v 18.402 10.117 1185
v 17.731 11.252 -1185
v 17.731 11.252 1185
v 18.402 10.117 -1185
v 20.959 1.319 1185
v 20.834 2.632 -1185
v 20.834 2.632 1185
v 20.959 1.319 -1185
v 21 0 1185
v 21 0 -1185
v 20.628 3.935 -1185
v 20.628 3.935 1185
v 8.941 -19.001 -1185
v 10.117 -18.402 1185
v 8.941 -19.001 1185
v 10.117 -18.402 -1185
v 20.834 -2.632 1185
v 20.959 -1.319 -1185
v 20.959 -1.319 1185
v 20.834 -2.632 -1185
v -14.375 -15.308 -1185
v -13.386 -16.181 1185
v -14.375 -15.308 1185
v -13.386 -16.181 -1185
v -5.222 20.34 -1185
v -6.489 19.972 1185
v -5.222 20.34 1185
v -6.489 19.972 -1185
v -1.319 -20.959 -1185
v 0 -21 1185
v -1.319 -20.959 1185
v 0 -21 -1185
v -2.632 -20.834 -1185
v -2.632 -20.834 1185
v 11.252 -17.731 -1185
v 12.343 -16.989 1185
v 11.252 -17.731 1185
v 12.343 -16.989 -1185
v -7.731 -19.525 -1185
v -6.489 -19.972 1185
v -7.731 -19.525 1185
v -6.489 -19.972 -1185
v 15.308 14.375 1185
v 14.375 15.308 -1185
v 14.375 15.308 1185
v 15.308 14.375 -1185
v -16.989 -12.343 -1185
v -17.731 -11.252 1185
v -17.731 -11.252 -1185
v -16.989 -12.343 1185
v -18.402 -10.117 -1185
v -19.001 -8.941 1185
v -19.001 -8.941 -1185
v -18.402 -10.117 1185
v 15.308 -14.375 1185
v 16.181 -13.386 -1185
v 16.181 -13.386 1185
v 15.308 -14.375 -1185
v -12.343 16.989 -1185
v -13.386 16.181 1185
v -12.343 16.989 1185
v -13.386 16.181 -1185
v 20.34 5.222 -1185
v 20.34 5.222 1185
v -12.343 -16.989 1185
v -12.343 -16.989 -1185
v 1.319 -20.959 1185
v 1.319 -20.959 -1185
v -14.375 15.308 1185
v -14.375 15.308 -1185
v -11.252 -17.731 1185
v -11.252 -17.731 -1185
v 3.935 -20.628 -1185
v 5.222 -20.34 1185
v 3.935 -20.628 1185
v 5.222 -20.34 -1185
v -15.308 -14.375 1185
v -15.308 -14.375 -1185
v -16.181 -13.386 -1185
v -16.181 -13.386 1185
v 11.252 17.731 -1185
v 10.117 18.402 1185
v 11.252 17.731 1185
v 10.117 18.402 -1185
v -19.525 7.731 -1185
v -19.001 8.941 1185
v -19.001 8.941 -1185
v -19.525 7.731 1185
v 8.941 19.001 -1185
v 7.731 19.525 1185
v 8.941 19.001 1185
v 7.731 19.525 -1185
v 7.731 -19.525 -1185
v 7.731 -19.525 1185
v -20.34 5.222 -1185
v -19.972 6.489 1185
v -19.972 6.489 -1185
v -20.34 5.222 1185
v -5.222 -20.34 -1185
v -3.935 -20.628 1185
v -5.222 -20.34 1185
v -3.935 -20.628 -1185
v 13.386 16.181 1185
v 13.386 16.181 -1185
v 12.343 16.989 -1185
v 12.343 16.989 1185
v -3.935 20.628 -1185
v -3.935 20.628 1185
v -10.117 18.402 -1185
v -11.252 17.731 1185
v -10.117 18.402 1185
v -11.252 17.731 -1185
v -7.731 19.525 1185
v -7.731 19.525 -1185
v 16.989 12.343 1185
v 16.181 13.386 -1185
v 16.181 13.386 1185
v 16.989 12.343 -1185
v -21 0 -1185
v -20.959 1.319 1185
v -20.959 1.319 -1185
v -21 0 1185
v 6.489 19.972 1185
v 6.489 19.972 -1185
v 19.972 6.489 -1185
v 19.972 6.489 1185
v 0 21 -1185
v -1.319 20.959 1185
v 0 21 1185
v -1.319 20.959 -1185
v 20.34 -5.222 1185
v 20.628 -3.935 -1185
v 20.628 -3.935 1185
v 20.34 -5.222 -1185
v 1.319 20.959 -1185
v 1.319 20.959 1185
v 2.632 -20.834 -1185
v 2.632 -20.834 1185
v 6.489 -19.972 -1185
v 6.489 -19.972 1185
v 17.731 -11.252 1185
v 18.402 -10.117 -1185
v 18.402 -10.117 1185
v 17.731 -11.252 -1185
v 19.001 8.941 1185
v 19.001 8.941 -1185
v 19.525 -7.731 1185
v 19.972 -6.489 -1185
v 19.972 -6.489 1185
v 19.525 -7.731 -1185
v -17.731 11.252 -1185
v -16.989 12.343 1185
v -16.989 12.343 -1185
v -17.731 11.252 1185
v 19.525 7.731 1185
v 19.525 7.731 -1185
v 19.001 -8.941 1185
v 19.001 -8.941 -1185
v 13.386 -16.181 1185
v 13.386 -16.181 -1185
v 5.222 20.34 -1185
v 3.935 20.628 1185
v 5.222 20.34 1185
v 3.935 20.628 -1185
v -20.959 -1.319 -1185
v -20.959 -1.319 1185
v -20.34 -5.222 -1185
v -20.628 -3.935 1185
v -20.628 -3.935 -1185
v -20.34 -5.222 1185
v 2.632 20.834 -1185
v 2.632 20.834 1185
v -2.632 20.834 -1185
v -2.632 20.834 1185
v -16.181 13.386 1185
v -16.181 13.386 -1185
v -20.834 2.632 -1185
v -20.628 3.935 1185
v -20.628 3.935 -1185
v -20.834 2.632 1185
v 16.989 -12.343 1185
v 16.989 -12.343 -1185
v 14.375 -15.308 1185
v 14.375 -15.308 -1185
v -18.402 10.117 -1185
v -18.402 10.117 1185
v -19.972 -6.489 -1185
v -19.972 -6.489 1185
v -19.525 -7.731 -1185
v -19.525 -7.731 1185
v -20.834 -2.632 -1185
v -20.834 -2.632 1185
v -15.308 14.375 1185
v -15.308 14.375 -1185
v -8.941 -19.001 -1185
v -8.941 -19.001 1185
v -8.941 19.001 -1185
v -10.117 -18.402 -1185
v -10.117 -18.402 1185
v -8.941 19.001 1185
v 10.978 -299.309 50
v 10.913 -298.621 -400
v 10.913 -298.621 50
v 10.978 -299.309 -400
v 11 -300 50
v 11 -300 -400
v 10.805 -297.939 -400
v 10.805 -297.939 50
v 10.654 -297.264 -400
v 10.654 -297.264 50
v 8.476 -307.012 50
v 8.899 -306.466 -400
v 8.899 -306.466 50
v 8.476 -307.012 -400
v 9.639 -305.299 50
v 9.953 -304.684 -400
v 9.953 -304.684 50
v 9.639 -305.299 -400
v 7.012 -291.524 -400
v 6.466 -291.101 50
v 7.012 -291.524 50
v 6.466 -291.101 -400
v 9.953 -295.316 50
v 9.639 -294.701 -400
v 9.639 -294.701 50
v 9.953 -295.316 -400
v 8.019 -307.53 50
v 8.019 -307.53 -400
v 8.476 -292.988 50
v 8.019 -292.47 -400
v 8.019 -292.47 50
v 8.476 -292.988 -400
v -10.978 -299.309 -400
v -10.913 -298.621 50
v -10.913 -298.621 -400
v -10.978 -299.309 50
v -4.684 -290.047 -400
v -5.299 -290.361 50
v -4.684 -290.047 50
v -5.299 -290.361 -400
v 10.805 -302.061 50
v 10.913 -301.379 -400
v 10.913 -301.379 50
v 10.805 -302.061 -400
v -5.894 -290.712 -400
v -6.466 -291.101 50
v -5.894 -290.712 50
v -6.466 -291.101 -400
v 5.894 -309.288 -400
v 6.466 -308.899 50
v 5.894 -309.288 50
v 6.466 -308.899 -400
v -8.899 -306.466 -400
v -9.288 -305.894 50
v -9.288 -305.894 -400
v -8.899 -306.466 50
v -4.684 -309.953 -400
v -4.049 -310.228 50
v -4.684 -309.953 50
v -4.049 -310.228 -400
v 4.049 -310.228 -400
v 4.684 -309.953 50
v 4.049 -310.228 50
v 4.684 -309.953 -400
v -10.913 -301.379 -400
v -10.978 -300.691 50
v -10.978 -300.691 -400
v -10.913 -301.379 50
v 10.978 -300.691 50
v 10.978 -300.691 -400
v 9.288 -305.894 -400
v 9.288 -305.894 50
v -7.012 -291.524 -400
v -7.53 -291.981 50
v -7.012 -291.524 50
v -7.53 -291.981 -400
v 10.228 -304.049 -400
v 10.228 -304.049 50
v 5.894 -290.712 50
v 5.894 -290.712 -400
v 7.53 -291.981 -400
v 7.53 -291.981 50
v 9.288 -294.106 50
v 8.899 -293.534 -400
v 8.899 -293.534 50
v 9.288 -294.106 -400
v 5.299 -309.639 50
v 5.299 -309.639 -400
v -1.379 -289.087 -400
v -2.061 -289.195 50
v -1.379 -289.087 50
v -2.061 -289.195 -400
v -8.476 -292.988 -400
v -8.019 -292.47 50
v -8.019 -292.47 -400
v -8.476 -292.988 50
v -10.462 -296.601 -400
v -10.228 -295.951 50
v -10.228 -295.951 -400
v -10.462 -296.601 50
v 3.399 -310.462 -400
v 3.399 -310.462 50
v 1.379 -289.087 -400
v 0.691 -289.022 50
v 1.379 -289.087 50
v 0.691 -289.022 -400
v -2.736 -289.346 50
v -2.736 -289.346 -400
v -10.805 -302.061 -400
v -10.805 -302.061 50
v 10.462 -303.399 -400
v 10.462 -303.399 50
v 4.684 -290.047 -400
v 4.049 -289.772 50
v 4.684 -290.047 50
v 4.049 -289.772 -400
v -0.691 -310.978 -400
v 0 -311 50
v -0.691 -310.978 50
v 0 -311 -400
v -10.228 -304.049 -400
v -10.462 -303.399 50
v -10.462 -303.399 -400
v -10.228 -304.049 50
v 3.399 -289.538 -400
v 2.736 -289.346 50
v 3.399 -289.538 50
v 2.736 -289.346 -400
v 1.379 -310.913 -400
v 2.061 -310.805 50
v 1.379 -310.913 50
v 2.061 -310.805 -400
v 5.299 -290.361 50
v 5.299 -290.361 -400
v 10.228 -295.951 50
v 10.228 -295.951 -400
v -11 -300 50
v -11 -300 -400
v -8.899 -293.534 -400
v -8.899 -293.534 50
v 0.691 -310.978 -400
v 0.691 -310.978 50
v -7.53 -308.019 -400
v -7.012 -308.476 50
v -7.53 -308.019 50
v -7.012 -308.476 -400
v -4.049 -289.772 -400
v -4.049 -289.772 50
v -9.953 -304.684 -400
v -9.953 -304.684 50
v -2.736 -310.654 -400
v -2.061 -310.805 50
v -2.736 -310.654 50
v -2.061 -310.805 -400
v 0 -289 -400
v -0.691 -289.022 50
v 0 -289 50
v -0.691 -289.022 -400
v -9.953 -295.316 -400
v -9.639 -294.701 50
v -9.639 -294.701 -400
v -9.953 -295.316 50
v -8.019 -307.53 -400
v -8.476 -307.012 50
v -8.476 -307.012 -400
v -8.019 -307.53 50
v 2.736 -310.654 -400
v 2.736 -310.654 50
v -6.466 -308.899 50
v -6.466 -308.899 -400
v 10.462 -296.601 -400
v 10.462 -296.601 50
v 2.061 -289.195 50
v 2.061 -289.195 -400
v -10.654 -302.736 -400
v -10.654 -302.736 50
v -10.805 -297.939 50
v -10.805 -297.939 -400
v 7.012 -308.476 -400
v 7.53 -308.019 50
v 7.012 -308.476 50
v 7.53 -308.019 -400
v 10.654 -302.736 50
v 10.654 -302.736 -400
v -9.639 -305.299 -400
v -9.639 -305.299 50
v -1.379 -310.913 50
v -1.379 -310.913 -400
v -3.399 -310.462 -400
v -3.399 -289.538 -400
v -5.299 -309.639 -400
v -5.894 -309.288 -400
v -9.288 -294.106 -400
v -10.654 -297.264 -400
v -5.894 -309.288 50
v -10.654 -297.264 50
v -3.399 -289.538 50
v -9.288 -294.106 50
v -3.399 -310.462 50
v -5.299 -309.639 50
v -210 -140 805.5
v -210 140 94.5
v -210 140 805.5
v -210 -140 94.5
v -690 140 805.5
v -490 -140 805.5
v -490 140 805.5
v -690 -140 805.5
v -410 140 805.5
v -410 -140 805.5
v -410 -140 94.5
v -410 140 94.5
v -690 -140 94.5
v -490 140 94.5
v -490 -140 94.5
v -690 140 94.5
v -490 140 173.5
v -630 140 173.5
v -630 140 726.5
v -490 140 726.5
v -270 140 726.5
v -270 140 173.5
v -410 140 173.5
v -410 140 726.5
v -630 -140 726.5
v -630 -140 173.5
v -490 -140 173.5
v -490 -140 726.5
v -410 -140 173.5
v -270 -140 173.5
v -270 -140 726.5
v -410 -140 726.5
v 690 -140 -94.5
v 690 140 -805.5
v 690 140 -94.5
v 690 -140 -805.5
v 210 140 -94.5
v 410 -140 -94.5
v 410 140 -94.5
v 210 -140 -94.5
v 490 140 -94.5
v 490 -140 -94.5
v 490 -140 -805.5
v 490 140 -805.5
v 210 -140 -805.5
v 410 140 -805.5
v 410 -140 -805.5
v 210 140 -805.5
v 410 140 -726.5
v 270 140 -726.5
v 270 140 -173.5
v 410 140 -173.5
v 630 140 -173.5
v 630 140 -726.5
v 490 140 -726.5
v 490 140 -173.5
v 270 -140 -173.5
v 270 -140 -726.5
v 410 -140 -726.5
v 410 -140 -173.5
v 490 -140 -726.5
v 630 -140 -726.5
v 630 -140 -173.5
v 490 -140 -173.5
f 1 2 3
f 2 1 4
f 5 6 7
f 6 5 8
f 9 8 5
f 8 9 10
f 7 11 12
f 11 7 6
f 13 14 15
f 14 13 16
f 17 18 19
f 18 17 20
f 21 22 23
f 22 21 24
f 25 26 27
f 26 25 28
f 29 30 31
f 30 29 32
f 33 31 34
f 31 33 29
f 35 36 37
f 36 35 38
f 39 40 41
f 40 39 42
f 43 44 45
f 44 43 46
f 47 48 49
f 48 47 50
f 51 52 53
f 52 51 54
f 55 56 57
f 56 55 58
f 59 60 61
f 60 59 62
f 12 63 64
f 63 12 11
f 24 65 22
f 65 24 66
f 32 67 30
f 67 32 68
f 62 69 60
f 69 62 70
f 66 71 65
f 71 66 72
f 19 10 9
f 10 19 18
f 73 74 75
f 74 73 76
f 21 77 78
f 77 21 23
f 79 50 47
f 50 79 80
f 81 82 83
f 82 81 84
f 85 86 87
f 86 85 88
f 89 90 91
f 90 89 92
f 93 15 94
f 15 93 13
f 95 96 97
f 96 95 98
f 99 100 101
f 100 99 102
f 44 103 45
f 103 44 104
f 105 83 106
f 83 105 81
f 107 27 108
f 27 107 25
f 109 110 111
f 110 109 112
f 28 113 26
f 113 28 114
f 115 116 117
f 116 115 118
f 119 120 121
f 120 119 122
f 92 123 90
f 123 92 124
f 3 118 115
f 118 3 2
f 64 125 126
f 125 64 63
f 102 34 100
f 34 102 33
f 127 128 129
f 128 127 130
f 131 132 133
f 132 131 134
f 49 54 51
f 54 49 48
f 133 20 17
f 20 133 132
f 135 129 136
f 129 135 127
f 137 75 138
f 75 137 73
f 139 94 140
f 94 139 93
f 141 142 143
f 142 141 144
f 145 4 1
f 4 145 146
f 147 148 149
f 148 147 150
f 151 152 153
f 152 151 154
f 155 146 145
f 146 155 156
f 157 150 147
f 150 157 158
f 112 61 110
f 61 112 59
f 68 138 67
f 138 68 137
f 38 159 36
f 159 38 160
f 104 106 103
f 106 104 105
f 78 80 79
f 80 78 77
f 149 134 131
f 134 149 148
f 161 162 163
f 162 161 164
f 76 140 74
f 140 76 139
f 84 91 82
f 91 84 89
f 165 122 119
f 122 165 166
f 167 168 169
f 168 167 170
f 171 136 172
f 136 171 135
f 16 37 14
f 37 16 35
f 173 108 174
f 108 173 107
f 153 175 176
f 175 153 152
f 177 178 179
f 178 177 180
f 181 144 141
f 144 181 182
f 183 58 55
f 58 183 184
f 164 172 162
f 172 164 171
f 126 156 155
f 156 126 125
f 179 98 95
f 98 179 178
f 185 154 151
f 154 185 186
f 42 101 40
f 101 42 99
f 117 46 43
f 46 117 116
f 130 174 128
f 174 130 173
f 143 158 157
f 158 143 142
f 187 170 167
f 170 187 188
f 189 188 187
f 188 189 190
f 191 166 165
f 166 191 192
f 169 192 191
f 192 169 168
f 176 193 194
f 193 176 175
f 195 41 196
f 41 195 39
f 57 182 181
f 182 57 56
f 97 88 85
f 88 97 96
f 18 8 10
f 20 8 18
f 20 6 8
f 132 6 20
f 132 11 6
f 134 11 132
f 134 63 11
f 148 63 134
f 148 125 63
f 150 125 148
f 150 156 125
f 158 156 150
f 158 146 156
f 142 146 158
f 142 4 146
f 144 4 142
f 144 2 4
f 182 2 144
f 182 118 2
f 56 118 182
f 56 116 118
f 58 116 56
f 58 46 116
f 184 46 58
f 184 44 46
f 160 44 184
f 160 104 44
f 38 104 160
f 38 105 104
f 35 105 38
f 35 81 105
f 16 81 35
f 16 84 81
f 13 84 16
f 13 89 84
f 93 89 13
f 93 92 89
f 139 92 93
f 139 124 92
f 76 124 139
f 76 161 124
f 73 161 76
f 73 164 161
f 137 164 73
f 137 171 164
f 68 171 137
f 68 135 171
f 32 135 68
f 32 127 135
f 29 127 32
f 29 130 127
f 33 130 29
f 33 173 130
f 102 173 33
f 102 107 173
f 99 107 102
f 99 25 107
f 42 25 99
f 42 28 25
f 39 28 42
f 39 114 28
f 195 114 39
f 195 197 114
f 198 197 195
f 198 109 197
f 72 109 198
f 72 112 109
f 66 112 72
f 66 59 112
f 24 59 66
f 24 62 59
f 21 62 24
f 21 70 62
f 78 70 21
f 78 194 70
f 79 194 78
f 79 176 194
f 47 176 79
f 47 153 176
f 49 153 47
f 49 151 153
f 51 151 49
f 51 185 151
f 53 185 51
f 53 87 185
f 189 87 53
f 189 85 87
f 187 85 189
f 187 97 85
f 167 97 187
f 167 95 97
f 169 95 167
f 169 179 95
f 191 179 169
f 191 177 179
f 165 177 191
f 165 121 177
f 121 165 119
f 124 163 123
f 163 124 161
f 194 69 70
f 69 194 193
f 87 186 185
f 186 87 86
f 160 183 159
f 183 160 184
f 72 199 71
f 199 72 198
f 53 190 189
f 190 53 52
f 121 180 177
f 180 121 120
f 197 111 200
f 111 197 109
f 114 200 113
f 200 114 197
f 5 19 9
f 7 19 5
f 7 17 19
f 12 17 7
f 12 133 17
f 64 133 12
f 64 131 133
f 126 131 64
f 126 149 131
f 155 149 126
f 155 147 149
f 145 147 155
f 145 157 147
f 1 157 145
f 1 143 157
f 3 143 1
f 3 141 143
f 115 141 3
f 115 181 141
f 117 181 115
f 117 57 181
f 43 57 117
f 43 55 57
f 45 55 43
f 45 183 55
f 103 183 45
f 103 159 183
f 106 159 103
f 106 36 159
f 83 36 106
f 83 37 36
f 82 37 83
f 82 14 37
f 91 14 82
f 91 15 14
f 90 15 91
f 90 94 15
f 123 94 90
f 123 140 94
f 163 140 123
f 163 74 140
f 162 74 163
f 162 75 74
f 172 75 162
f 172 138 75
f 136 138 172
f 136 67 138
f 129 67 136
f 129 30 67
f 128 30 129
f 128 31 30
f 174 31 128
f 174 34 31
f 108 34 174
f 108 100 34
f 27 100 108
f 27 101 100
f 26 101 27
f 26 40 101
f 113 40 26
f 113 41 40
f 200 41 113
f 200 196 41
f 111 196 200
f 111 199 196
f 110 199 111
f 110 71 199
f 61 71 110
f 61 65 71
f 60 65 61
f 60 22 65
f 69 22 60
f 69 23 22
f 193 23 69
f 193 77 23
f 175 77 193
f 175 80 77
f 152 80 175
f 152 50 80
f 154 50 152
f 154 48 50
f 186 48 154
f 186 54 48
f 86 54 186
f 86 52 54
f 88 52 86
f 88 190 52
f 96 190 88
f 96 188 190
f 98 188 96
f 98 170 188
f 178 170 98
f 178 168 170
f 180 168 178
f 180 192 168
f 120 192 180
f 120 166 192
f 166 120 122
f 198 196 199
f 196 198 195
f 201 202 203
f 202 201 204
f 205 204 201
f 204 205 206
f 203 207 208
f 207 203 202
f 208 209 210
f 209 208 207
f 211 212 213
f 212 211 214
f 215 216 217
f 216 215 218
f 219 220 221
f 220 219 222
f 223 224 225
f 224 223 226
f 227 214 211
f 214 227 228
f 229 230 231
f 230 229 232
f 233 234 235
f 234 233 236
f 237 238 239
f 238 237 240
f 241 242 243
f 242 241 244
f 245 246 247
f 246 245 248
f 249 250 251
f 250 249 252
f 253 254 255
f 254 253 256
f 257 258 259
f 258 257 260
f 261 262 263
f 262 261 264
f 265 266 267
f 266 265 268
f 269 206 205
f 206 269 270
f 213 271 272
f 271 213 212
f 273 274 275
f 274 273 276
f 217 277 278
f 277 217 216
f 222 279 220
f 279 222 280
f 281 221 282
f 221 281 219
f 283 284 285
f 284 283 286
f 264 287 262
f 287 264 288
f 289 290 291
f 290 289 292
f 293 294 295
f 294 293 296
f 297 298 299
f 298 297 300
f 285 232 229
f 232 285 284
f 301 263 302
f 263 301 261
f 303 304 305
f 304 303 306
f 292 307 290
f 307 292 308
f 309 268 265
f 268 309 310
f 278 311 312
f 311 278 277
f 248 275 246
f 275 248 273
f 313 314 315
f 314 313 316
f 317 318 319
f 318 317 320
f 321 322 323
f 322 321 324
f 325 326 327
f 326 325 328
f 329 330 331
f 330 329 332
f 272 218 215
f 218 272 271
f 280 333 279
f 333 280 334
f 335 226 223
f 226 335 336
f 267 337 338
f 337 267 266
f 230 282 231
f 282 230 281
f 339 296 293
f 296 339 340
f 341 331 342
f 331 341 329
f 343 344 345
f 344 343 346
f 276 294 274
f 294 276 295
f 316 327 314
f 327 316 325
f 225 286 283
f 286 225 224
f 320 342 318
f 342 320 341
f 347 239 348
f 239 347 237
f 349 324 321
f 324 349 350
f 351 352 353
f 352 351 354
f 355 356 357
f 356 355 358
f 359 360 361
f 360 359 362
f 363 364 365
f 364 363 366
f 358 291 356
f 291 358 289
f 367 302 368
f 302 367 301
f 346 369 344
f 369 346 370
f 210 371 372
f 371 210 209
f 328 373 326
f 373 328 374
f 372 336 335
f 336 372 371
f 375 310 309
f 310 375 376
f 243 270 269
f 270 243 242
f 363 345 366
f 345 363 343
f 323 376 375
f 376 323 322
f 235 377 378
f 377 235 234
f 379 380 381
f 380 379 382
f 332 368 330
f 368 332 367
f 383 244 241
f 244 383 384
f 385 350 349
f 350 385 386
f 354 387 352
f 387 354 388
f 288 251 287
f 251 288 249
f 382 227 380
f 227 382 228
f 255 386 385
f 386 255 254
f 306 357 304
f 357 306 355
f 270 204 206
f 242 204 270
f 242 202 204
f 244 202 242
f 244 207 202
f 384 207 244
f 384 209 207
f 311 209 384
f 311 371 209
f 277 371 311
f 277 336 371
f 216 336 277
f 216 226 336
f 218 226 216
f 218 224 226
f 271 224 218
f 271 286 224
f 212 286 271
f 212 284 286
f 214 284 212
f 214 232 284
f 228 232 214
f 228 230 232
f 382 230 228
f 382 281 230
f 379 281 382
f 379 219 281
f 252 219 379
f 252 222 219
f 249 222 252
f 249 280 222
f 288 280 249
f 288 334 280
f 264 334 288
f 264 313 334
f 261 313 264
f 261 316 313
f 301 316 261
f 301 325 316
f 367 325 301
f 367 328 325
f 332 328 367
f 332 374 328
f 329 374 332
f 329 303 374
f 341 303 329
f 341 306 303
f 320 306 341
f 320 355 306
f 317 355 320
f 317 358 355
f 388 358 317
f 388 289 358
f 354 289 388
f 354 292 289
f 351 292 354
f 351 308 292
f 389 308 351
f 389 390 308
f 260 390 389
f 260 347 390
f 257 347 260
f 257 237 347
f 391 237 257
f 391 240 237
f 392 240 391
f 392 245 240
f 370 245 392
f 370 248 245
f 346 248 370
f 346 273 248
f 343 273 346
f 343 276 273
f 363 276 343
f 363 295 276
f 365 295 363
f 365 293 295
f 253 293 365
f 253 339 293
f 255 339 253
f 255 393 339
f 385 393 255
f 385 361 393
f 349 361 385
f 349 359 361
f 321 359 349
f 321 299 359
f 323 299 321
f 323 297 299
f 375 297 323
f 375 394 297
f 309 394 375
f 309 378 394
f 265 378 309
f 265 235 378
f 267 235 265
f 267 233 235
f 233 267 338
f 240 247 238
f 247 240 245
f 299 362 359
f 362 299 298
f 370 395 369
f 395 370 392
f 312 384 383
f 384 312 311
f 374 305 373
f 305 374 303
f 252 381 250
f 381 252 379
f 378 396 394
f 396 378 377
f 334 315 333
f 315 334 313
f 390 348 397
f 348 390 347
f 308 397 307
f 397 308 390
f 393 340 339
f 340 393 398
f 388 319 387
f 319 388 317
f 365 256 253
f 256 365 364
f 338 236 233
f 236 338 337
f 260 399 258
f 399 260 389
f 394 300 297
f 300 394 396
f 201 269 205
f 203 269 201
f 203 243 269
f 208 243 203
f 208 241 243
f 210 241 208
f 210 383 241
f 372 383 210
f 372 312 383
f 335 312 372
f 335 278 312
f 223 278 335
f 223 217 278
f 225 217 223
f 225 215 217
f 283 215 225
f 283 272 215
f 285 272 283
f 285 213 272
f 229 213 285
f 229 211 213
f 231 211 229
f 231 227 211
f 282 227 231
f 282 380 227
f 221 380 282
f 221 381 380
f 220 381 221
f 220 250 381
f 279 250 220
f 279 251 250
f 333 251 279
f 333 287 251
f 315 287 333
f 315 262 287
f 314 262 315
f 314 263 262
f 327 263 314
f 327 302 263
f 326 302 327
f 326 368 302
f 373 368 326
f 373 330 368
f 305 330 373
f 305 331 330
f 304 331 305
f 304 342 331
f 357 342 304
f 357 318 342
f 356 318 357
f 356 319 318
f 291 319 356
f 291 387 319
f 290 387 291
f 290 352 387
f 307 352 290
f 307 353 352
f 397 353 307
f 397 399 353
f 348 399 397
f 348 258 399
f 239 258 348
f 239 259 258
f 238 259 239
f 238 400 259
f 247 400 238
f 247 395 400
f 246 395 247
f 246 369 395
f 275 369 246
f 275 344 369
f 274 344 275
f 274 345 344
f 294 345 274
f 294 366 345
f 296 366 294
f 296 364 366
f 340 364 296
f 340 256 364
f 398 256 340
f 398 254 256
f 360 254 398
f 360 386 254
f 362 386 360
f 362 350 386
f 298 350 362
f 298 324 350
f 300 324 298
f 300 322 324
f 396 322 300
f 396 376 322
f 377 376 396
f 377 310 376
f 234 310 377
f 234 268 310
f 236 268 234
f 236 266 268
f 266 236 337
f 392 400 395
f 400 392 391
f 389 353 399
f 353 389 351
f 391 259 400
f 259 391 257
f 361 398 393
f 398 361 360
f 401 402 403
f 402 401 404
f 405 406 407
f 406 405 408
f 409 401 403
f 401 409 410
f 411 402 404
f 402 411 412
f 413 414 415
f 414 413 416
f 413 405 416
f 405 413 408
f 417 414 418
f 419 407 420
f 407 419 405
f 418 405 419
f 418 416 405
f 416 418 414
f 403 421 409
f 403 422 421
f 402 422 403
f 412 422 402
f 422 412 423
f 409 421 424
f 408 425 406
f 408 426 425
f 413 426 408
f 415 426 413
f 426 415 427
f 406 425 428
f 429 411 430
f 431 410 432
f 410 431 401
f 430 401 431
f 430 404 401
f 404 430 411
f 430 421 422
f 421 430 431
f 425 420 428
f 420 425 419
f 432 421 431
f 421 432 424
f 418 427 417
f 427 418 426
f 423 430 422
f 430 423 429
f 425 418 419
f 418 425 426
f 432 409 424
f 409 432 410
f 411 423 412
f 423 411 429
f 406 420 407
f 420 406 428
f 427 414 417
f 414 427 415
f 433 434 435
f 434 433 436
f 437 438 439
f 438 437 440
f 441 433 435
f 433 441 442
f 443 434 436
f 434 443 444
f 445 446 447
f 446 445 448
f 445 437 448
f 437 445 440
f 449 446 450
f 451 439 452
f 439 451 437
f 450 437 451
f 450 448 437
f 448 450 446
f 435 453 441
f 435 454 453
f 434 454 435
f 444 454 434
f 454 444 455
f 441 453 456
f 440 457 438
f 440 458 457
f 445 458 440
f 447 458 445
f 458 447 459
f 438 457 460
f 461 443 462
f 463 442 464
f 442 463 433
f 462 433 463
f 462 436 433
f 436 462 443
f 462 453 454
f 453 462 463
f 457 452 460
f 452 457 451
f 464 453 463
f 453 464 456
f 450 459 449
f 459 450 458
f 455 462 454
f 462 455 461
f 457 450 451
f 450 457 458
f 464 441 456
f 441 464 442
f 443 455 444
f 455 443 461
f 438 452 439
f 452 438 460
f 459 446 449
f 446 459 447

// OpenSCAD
// ============================================================================
// PROJECT: XXXG-00W0 WING GUNDAM ZERO EW - FLIGHT SURFACE INFRA
// COMPONENT VAULT: BANDAI CAST RUNNER W - SUB-FRAME RIBS W1 & W2
// PACKAGING RE-ARCHITECTURE: SUB-ARMOR CAPACITOR RECESSED BANK INTEGRATION
// CONFIG METRIC: SCALED TITANIUM CASTS (1:1 ACTUAL METRIC UP-SCALE)
// ============================================================================

$fn = 100; // Circular segment rendering resolution count

// Structural Constants Scaled 1:1 for a 16.7-Meter Airframe Scale (mm)
rib_total_length = 1580;                 // Total longitudinal cantilever length (mm)
rib_base_depth = 480;                   // Maximum depth of base frame anchor (mm)
armor_skin_thickness = 60;              // Solid TiAl protective plating wall (mm)
harness_conduit_width = 80;             // Cast-in 4oz copper logic trace track (mm)
capacitor_pocket_depth = 15;            // Sub-armor recessed housing pocket depth (mm)
capacitor_pocket_width = 140;           // Transverse MLCC array pocket width (mm)

module Runner_W_Wing_Rib_Forge() {
    // Central Supply Injection Runner Axis (Molten Feed Line from Siphon Forge)
    color([0.22, 0.22, 0.25]) {
        cylinder(h = rib_total_length * 1.5, d = 42, center = true);
        // Direct injection gates tracking straight into the part mold cavities
        translate() rotate() cylinder(h = 450, d = 22);
        translate([0, -300, -400]) rotate() cylinder(h = 450, d = 22);
    }
    
    // Instantiate Scaled Skeutomorphic Part Molds Symmetrically (Left & Right)
    Cast_Internal_Subframe_Ribs();
}

module Cast_Internal_Subframe_Ribs() {
    // ---- PART W1: INTERNAL LEFT MAIN WING UPPER SUB-FRAME RIB ----
    translate([-450, 0, 450]) color([0.35, 0.35, 0.38]) { // Inner Frame Dark Spec
        difference() {
            // Main solid heavy-duty cantilever rib plate segment
            cube([rib_base_depth, 280, rib_total_length * 0.45], center = true);
            
            // Core structural cutout for trailing edge plumage track alignment
            cube([rib_base_depth - (armor_skin_thickness * 2), 300, rib_total_length * 0.35], center = true);
            
            // SUB-ARMOR RECESSED CAPACITOR POCKETS [Segmented rows cut inside the frame walls]
            for (z_offset = [-200, 0, 200]) {
                translate([(rib_base_depth * 0.25 - armor_skin_thickness + capacitor_pocket_depth/2), 0, z_offset])
                    cube([capacitor_pocket_depth, capacitor_pocket_width, 100], center = true);
            }
            
            // Continuous cast-in routing track for the 4oz solid-state wiring rails
            cube([harness_conduit_width, 300, rib_total_length], center = true);
        }
    }
    
    // ---- PART W2: INTERNAL RIGHT MAIN WING UPPER SUB-FRAME RIB ----
    translate([450, 0, -450]) rotate() color([0.35, 0.35, 0.38]) {
        difference() {
            cube([rib_base_depth, 280, rib_total_length * 0.45], center = true);
            cube([rib_base_depth - (armor_skin_thickness * 2), 300, rib_total_length * 0.35], center = true);
            
            for (z_offset = [-200, 0, 200]) {
                translate([(rib_base_depth * 0.25 - armor_skin_thickness + capacitor_pocket_depth/2), 0, z_offset])
                    cube([capacitor_pocket_depth, capacitor_pocket_width, 100], center = true);
            }
            
            cube([harness_conduit_width, 300, rib_total_length], center = true);
        }
    }
}

// Render Master Assembly to Parameter Workspace
Runner_W_Wing_Rib_Forge();
